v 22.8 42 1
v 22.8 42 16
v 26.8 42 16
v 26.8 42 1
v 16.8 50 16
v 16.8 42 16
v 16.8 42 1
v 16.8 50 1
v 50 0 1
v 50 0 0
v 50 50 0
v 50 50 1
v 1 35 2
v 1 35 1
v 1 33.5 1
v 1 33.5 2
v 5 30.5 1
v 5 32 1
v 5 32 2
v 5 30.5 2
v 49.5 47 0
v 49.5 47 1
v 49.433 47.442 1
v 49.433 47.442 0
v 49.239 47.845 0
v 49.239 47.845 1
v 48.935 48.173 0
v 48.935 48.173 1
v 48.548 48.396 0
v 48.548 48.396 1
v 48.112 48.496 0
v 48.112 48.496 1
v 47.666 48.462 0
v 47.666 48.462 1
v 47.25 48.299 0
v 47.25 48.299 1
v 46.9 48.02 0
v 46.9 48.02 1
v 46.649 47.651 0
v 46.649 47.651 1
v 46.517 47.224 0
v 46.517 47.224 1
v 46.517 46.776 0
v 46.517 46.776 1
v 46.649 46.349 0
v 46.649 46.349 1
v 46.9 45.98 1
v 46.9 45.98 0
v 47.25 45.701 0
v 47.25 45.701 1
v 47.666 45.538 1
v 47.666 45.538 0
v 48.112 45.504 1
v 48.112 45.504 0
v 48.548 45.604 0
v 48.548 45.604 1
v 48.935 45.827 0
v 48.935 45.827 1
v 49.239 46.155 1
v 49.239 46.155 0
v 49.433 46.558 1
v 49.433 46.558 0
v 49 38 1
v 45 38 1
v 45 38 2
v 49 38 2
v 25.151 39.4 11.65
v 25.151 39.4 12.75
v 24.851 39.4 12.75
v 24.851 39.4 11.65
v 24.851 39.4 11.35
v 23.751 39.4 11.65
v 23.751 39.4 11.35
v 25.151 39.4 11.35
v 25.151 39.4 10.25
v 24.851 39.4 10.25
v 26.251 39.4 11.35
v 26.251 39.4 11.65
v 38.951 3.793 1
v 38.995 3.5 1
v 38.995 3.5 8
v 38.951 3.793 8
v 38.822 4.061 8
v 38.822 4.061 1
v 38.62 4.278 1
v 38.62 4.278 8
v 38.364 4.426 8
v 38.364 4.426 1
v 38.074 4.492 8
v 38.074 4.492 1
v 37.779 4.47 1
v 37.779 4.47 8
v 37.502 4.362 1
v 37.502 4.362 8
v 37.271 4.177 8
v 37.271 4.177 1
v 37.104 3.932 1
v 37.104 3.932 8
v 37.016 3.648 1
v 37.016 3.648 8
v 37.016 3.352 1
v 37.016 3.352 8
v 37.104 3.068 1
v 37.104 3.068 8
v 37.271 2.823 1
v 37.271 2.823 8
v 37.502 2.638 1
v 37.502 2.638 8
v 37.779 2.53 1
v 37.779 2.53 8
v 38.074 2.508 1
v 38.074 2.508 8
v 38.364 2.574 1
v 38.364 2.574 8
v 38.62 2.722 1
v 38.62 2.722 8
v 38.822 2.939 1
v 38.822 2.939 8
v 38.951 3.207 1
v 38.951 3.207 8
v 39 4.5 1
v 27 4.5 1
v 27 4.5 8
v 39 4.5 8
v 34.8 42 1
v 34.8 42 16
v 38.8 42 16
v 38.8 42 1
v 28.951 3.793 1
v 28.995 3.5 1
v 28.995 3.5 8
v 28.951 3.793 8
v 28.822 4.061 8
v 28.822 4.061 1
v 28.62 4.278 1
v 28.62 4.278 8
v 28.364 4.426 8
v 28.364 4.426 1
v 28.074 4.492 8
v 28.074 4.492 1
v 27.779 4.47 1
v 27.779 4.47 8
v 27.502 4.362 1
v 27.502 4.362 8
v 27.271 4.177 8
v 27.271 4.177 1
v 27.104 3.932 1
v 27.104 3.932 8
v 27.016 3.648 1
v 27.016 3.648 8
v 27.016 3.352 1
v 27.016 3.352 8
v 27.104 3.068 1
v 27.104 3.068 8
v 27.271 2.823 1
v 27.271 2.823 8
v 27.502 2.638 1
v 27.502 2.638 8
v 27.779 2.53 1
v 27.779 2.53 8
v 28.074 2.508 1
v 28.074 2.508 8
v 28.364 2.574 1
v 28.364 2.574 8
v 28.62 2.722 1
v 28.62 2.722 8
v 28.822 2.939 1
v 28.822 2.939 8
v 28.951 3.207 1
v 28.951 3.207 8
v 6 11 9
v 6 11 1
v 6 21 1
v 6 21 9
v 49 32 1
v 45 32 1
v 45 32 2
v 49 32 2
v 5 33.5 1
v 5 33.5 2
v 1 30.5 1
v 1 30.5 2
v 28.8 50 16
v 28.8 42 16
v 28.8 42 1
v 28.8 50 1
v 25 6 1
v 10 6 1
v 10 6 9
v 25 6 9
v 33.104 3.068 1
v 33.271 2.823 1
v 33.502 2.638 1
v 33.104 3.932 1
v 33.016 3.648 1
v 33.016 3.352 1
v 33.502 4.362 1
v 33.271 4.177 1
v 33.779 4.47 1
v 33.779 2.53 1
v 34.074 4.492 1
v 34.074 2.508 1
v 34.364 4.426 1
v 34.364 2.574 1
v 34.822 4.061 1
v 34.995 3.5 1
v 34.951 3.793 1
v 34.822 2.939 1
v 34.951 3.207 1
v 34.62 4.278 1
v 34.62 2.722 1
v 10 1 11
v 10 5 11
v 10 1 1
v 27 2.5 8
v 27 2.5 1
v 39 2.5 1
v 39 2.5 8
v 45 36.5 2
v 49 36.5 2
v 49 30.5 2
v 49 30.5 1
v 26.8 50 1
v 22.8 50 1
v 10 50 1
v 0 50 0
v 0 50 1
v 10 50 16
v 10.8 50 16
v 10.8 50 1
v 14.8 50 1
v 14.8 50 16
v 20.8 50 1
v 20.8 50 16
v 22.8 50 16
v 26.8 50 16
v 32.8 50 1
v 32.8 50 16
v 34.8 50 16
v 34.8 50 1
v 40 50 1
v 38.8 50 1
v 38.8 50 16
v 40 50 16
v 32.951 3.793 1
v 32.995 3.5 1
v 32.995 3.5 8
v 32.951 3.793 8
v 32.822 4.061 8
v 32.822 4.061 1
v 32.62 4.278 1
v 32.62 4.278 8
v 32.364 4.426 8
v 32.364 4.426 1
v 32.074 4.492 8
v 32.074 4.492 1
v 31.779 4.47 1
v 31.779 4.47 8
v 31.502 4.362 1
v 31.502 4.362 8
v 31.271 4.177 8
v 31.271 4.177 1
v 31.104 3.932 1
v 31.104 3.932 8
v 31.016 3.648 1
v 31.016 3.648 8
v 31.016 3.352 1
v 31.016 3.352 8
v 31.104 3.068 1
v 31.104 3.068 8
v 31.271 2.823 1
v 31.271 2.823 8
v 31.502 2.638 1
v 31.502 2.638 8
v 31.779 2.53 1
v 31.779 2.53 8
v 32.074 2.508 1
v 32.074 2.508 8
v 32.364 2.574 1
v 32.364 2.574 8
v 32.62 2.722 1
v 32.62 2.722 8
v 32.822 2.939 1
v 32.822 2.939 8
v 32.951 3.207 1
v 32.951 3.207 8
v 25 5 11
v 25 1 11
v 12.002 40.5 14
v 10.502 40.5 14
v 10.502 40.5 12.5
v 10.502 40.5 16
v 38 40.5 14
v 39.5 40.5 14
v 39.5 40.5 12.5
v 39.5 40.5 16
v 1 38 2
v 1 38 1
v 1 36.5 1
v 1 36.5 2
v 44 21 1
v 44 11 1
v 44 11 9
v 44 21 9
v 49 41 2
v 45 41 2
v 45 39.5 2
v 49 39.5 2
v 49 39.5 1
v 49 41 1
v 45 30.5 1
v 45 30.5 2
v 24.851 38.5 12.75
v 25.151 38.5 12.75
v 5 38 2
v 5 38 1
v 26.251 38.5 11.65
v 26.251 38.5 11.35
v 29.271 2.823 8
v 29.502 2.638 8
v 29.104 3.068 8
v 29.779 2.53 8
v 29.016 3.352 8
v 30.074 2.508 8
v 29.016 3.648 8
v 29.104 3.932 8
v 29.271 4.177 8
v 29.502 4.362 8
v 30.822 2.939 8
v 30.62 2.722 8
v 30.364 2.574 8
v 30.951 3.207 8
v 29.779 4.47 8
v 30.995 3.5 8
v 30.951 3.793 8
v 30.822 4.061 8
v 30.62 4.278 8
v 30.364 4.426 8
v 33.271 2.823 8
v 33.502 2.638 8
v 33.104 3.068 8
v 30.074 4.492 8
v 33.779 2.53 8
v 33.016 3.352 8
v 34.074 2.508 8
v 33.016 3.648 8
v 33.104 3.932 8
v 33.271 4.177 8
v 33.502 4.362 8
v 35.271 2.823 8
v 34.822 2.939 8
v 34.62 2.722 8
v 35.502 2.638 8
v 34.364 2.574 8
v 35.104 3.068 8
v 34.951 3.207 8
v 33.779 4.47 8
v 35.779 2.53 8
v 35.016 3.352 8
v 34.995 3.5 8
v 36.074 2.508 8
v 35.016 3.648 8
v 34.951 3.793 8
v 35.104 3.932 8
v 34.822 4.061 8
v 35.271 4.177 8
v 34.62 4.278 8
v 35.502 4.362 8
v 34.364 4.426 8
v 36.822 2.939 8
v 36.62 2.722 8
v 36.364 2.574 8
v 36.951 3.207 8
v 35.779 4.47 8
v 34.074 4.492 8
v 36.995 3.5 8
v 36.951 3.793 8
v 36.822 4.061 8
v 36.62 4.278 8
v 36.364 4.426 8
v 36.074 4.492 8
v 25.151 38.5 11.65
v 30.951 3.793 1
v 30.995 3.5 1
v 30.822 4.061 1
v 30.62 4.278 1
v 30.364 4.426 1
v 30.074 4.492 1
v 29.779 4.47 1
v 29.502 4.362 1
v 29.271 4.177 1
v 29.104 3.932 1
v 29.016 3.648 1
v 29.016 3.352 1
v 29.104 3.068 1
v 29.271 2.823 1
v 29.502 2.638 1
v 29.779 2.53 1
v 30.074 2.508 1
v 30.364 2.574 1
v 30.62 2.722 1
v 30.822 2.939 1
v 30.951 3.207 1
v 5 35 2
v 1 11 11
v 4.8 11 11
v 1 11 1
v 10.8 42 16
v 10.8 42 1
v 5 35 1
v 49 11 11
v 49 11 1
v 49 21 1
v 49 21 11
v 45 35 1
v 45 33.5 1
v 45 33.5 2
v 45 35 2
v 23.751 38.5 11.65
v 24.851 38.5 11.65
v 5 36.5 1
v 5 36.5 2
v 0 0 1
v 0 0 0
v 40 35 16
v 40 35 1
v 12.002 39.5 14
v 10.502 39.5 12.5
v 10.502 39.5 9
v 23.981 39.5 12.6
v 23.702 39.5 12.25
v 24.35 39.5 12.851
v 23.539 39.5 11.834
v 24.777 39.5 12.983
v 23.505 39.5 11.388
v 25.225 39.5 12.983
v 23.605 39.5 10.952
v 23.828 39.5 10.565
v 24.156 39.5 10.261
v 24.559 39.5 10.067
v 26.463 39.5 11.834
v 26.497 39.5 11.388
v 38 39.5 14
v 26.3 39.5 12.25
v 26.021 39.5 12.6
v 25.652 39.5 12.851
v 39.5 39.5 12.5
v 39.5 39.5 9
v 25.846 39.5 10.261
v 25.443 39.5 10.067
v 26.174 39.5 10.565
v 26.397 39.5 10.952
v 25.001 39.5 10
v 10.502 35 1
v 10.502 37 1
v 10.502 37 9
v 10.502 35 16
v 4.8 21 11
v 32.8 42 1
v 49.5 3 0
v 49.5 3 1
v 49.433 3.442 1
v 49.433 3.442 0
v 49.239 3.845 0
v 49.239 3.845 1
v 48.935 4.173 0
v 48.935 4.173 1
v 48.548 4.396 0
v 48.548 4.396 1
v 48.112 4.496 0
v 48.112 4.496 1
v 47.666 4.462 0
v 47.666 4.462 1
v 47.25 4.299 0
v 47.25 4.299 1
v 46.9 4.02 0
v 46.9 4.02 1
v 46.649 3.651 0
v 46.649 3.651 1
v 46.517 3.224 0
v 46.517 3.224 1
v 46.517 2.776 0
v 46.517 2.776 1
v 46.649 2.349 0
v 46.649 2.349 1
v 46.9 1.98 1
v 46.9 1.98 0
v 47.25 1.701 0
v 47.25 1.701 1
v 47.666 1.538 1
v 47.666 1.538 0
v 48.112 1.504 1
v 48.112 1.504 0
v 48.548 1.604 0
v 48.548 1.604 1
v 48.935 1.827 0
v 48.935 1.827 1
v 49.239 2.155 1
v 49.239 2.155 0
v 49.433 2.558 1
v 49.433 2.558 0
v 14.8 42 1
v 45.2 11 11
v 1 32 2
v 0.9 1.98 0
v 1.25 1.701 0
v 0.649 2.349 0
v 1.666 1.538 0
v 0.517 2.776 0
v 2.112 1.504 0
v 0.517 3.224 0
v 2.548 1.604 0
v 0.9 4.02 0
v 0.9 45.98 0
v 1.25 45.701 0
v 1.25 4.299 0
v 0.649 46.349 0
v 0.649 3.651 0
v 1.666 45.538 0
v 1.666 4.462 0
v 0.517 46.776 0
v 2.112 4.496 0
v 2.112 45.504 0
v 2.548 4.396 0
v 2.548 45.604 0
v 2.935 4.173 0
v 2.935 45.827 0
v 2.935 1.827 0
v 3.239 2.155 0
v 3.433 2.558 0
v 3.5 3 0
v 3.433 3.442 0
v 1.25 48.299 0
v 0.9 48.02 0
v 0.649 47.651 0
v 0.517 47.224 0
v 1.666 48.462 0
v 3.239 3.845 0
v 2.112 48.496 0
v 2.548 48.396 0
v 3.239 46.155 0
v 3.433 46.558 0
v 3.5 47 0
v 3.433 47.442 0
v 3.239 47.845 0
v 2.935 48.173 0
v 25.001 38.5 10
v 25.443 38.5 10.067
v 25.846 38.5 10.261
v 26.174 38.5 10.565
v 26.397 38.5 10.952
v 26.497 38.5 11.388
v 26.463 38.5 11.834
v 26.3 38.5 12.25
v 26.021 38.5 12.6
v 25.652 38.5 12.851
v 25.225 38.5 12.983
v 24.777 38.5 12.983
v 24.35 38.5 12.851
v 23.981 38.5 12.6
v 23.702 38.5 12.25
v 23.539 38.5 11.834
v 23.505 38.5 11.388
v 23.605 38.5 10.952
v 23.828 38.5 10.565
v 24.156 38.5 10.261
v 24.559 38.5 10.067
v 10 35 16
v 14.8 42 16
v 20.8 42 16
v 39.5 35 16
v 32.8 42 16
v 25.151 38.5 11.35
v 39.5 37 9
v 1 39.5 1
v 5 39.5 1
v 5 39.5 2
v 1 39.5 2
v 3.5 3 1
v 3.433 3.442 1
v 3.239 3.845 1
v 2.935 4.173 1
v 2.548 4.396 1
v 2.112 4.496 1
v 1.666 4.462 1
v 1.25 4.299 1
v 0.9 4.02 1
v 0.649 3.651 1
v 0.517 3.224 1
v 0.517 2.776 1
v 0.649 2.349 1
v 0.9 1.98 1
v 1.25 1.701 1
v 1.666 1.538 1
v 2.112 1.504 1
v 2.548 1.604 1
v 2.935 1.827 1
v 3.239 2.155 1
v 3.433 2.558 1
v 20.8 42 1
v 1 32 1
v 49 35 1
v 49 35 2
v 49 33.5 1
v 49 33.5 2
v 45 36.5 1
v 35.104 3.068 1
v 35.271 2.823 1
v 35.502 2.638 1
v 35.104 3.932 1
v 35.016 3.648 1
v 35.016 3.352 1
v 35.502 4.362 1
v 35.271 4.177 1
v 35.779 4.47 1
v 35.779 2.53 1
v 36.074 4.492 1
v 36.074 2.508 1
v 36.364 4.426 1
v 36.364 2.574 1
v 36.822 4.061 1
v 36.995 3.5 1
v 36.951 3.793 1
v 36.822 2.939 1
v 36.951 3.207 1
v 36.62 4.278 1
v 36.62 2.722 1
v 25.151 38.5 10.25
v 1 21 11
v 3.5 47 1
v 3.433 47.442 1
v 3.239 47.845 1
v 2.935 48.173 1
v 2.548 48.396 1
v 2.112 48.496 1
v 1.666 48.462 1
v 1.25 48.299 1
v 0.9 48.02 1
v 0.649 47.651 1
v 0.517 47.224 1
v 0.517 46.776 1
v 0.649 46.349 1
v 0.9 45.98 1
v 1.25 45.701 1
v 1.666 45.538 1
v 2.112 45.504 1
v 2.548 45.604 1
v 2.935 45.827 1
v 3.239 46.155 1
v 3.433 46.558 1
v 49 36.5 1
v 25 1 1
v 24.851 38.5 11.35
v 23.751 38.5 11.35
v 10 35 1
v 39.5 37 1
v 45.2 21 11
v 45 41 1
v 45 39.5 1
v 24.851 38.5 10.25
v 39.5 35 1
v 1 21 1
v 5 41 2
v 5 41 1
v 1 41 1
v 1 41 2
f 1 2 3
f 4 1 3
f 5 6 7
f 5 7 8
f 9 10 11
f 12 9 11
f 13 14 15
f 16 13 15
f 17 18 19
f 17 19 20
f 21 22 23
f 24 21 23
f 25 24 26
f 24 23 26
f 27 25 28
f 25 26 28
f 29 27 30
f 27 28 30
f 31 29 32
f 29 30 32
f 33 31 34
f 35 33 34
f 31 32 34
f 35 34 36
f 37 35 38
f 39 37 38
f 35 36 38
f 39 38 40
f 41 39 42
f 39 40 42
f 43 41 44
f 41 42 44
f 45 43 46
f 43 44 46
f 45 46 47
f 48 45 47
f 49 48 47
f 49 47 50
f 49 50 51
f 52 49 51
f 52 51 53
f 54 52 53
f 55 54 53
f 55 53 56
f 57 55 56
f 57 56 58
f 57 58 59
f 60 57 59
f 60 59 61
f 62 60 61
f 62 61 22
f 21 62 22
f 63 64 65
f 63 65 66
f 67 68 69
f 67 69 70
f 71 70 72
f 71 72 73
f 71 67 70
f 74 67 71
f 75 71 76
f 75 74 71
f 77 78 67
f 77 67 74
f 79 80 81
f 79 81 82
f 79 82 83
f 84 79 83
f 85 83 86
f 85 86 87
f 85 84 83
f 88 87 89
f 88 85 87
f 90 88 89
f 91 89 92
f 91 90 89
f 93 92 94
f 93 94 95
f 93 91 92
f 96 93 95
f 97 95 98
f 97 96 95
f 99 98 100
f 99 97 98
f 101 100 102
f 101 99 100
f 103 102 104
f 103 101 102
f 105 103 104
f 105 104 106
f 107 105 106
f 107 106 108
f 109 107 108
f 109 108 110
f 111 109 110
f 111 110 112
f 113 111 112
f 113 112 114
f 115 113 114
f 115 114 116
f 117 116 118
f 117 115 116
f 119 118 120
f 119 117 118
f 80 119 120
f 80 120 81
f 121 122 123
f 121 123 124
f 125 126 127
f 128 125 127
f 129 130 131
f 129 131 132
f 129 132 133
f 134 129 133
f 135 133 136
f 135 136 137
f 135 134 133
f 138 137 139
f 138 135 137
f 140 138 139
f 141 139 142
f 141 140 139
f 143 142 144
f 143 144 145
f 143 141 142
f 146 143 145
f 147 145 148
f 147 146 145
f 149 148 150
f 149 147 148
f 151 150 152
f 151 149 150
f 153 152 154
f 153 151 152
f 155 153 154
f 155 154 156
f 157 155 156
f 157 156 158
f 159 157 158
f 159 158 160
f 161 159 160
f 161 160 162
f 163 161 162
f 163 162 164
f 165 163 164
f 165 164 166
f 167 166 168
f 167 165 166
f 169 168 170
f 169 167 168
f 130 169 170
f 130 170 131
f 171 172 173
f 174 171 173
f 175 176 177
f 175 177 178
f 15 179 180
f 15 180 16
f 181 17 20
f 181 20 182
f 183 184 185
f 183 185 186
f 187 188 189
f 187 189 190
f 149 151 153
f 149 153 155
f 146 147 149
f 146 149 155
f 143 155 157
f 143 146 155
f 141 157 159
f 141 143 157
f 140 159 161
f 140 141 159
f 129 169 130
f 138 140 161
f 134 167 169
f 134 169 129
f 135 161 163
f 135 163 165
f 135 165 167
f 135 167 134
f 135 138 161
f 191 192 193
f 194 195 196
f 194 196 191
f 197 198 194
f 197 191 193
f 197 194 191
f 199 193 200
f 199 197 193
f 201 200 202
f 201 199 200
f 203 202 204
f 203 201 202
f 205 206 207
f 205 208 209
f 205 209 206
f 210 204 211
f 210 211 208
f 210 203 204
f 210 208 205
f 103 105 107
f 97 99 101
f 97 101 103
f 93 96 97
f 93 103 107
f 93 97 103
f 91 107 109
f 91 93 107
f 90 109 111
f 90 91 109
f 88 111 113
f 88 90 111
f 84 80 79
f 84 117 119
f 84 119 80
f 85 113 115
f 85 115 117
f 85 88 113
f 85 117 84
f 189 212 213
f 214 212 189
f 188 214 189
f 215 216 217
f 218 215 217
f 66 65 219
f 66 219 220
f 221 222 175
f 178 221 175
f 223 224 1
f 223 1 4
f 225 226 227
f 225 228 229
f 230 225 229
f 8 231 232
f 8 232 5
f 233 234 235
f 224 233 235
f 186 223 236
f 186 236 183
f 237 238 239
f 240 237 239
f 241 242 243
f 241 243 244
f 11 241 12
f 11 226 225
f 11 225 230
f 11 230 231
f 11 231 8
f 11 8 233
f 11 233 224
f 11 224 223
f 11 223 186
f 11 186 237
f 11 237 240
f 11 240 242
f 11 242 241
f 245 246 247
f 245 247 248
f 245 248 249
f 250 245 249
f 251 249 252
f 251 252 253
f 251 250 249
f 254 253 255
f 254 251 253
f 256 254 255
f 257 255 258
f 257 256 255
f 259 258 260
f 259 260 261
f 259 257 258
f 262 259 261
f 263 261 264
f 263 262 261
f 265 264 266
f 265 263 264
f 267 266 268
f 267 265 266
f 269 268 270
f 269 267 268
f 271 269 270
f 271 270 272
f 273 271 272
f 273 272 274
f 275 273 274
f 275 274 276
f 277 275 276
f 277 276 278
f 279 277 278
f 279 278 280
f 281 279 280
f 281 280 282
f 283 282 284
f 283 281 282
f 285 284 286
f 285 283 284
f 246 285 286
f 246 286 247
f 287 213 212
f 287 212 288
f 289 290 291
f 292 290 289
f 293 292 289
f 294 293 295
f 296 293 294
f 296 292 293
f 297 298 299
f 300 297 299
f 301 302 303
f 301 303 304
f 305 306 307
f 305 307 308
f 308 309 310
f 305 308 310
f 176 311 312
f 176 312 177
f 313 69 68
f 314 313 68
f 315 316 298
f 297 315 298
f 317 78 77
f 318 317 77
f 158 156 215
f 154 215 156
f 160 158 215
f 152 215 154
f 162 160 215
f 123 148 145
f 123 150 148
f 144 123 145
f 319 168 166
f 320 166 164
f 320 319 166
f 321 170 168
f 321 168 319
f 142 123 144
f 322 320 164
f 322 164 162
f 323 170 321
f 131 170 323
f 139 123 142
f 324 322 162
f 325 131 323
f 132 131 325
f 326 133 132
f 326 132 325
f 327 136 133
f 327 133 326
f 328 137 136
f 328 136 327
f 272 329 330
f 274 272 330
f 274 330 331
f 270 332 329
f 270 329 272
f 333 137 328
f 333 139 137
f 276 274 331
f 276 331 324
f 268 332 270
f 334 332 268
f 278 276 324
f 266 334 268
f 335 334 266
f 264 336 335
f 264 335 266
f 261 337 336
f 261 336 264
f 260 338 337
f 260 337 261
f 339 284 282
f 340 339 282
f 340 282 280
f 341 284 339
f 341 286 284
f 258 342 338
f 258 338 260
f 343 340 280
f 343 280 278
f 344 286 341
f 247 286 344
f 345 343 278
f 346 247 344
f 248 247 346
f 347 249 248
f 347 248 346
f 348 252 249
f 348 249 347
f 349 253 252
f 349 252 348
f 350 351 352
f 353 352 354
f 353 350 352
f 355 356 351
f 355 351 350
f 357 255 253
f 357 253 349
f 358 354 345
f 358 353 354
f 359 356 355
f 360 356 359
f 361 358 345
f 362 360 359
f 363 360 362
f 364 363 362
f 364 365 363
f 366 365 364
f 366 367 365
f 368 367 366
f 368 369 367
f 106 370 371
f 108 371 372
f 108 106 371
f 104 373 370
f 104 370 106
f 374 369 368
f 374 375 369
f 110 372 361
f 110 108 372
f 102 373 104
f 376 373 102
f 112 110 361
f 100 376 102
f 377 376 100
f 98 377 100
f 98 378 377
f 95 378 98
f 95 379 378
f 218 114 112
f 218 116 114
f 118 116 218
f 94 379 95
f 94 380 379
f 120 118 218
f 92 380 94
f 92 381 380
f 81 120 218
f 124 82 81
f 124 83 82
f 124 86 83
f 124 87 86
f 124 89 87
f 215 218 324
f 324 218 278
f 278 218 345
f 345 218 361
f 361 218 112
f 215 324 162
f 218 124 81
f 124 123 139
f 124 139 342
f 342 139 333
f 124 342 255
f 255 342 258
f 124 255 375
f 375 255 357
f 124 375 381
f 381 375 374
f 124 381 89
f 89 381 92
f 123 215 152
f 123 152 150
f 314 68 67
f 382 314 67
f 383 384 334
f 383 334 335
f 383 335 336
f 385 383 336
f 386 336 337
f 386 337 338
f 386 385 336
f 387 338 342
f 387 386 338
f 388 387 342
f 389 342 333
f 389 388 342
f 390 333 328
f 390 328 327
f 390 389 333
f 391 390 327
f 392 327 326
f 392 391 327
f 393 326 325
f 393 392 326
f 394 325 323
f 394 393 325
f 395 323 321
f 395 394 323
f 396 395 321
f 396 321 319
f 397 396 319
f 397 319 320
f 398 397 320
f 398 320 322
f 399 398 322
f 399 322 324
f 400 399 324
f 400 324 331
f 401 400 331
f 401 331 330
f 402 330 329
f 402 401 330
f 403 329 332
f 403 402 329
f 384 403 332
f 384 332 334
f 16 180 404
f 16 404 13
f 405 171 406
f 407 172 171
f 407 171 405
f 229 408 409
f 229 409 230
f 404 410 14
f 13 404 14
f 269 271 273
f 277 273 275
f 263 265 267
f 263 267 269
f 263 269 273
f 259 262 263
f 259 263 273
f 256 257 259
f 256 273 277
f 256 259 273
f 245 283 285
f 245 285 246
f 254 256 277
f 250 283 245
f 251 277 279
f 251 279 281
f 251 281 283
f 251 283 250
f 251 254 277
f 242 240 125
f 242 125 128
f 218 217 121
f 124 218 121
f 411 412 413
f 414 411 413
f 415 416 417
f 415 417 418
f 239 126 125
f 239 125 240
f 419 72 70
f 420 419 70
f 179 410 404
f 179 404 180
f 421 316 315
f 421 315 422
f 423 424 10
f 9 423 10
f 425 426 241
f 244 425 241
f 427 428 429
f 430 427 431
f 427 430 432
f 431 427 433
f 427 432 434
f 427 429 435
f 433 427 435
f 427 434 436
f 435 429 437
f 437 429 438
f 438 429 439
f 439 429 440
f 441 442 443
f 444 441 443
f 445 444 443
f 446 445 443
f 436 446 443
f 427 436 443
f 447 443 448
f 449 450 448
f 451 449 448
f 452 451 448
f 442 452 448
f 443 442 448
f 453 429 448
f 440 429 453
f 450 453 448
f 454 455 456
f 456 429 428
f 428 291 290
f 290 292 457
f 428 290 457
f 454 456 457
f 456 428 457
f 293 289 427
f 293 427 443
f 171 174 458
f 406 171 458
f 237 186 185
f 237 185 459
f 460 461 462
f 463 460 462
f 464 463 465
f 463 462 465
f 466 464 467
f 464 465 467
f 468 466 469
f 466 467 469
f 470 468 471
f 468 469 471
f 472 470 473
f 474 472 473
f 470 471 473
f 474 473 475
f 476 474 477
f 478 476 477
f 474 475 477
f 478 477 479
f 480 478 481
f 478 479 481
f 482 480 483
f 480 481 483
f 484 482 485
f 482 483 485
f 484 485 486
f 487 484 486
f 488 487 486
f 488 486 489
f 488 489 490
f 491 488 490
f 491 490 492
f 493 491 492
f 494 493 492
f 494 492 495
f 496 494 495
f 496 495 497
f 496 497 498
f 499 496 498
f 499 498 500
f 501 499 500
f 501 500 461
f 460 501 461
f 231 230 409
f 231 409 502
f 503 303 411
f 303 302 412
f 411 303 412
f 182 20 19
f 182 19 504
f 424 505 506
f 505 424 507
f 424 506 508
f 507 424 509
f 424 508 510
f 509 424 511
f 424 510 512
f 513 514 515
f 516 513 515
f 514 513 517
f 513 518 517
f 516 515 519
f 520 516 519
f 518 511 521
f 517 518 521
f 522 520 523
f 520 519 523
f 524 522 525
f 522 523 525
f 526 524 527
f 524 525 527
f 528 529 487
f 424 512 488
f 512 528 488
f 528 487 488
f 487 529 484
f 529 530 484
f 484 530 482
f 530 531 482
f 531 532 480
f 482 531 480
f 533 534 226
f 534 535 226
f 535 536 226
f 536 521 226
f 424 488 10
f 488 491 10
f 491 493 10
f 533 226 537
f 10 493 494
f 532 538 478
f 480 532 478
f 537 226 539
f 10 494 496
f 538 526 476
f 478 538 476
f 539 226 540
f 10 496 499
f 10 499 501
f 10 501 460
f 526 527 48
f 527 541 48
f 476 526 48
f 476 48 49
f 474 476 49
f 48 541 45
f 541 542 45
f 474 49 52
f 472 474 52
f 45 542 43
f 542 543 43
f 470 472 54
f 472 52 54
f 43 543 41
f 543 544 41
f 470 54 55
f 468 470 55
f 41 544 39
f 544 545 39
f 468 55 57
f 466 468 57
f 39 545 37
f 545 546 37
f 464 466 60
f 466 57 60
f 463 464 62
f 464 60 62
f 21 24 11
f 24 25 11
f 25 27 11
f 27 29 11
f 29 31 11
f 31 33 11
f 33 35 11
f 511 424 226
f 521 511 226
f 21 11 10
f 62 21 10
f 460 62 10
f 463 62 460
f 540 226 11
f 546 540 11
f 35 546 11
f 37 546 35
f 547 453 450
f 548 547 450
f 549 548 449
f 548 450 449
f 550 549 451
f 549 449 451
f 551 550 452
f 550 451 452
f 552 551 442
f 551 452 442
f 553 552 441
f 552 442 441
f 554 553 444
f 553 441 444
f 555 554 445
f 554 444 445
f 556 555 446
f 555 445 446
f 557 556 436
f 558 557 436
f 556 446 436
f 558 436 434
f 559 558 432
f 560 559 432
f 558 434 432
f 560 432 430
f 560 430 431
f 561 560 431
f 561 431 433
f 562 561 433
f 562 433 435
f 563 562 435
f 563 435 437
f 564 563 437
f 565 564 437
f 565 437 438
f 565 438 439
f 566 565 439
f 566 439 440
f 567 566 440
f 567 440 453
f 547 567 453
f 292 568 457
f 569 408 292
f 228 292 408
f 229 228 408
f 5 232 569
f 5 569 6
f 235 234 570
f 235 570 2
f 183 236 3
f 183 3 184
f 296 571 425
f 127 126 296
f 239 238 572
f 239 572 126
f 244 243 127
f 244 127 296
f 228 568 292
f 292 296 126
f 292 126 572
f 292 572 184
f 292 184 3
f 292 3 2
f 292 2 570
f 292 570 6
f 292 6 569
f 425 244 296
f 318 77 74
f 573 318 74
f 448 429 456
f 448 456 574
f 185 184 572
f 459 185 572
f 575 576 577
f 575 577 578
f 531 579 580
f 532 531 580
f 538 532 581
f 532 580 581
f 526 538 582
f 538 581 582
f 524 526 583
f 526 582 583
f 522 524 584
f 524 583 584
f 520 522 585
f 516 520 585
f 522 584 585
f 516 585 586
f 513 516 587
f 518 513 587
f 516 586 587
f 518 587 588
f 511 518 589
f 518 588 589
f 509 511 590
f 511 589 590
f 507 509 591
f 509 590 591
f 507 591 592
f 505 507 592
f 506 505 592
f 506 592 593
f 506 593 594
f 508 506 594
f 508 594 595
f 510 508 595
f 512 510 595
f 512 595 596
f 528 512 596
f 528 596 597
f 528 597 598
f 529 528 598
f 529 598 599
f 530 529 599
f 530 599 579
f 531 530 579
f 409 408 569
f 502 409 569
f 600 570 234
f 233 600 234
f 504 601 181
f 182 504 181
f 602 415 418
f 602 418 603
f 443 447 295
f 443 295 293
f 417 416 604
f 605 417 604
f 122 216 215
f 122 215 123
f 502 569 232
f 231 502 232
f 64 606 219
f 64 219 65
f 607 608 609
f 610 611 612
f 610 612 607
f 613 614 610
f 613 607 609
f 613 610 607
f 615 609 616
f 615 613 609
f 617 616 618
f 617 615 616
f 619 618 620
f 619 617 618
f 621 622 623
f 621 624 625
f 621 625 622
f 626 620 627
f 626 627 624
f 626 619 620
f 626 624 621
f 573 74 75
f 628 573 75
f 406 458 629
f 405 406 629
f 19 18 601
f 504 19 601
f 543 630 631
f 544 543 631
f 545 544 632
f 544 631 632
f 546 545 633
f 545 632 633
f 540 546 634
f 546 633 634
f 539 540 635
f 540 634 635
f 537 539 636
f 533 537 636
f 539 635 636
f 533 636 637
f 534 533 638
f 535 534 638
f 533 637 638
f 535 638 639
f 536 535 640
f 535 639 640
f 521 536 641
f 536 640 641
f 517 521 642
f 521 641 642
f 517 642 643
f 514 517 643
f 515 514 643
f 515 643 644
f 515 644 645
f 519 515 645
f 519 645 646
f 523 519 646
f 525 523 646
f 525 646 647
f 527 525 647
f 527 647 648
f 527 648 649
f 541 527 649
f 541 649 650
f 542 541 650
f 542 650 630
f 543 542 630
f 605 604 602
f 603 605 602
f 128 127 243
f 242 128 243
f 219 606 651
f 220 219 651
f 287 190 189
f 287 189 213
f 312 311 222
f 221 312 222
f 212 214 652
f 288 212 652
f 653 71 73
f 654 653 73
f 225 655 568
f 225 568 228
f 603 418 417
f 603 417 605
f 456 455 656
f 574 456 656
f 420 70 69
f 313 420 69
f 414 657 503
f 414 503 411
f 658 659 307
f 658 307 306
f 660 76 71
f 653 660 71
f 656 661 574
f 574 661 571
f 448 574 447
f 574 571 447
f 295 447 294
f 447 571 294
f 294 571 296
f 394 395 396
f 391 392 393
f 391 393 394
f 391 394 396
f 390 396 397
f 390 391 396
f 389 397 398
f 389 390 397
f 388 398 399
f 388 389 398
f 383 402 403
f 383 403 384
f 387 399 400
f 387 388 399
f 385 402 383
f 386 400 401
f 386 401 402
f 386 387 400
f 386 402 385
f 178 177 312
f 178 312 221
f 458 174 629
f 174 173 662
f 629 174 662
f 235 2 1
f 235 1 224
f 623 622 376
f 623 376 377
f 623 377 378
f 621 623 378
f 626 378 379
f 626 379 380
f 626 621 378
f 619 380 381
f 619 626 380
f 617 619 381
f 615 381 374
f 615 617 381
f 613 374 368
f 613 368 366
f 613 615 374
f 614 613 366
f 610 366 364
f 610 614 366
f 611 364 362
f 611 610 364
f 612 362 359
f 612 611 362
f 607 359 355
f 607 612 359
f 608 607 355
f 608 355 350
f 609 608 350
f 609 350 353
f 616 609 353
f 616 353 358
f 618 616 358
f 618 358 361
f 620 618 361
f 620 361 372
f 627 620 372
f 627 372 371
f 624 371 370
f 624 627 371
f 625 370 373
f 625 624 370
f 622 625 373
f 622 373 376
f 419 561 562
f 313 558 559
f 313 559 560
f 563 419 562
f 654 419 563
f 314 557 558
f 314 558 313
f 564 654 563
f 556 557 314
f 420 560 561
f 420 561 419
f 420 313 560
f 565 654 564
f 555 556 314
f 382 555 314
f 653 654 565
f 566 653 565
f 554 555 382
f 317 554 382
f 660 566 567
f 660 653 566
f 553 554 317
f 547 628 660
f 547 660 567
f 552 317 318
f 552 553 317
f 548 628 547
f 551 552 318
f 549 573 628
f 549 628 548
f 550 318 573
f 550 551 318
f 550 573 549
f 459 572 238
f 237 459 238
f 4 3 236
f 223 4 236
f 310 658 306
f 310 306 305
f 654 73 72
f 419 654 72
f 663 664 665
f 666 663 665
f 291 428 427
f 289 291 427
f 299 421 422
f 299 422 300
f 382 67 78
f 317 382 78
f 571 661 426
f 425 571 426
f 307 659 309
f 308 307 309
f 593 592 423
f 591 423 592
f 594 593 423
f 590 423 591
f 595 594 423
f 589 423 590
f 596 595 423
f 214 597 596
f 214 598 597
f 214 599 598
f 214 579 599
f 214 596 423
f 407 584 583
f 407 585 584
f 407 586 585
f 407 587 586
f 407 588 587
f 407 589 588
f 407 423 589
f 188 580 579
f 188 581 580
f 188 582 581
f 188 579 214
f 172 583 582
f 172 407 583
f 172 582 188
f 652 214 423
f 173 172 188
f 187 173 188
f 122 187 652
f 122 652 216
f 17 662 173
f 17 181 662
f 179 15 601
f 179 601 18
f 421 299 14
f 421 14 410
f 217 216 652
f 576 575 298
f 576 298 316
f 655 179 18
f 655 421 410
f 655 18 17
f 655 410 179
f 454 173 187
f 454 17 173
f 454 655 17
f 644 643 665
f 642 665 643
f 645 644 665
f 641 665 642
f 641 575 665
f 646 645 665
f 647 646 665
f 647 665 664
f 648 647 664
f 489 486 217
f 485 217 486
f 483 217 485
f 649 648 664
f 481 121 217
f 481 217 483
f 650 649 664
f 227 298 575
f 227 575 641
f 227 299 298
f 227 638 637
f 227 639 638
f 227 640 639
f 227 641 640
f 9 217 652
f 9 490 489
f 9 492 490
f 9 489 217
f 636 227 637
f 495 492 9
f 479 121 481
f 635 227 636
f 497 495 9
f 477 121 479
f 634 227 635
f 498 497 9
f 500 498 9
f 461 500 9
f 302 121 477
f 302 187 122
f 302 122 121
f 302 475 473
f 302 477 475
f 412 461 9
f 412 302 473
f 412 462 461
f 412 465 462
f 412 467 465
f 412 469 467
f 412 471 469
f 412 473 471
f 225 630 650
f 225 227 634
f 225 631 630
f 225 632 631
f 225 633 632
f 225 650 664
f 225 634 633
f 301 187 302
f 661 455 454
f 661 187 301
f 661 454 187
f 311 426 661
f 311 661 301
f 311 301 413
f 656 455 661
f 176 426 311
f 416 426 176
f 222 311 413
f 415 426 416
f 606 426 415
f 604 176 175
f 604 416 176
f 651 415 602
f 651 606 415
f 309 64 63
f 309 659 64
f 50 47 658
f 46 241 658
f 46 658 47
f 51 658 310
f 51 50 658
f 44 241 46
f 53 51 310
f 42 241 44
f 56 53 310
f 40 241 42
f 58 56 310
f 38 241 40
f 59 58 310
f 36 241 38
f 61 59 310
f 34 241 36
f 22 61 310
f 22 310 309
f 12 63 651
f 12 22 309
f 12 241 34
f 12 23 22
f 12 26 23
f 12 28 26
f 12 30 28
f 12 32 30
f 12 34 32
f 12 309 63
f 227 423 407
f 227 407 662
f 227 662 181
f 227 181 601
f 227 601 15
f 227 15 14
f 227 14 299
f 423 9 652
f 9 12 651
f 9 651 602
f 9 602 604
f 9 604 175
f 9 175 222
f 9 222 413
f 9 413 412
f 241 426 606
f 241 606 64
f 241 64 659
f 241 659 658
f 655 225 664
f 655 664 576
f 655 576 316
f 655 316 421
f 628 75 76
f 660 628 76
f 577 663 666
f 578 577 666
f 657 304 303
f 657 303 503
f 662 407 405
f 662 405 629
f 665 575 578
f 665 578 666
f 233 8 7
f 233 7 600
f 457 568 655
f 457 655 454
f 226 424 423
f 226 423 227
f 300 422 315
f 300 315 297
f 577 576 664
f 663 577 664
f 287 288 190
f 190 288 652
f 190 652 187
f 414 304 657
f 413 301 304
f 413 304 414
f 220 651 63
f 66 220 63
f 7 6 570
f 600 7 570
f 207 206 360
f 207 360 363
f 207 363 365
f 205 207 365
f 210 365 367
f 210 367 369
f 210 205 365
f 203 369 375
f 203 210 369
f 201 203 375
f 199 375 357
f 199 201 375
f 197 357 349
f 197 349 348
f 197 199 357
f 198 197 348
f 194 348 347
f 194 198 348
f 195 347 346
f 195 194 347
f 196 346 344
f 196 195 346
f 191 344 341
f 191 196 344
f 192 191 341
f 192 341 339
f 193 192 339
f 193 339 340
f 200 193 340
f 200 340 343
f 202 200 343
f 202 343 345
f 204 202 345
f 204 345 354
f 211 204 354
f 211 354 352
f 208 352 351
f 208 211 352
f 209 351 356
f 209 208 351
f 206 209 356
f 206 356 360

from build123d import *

# Parameters (mm, degrees)
SKETCH1_W               = 50
SKETCH1_H               = 50
BOSS_EXTRUDE1_DEPTH     = 1
SKETCH2_W               = 30
SKETCH2_H               = 15
BOSS_EXTRUDE2_DEPTH     = 15
SKETCH3_W               = 4
SKETCH3_H               = 8
CUT_EXTRUDE1_DEPTH      = 15
LPATTERN1_COUNT         = 5
LPATTERN1_PITCH         = 6
SKETCH4_W               = 28.997930891
SKETCH4_H               = 2
SKETCH4_H_2             = 2.5
SKETCH4_H_3             = 1
CUT_EXTRUDE2_DEPTH      = 2
CUT_EXTRUDE3_START      = -7
SKETCH4_3_W             = 28.997930891
SKETCH4_3_H             = 2
SKETCH4_3_H_2           = 2.5
CUT_EXTRUDE3_DEPTH      = 5
CUT_EXTRUDE4_START      = -15
SKETCH4_4_W             = 28.997930891
SKETCH4_4_H             = 2
CUT_EXTRUDE4_DEPTH      = 8
CUT_EXTRUDE5_DEPTH      = 1
SKETCH6_R               = 1.5
SKETCH6_W               = 2.5
SKETCH6_H               = 0.3
SKETCH6_W_2             = 0.3
SKETCH6_H_2             = 2.5
SKETCH6_H_3             = 1.1
SKETCH6_W_3             = 1.1
BOSS_EXTRUDE3_DEPTH     = 0.1
SKETCH6_3_R             = 1.5
BOSS_EXTRUDE4_DEPTH     = 1
SKETCH7_R               = 1.5
CUT_EXTRUDE6_DEPTH      = 73.284161474
SKETCH8_W               = 4
SKETCH8_H               = 1.5
BOSS_EXTRUDE5_DEPTH     = 1
LPATTERN2_COUNT         = 4
LPATTERN2_PITCH         = 3
MIRROR1_COPY_1_SKETCH_W = 4
MIRROR1_COPY_1_SKETCH_H = 1.5
MIRROR1_COPY_1_DEPTH    = 1
MIRROR1_COPY_2_SKETCH_W = 4
MIRROR1_COPY_2_SKETCH_H = 1.5
MIRROR1_COPY_2_DEPTH    = 1
MIRROR1_COPY_3_SKETCH_W = 4
MIRROR1_COPY_3_SKETCH_H = 1.5
MIRROR1_COPY_3_DEPTH    = 1
SKETCH9_W               = 5
SKETCH9_H               = 10
BOSS_EXTRUDE6_DEPTH     = 10
CUT_EXTRUDE7_DEPTH      = 10
SKETCH11_W              = 15
SKETCH11_H              = 5
BOSS_EXTRUDE7_DEPTH     = 10
CUT_EXTRUDE8_REACH      = 60.146
SKETCH13_W              = 2
SKETCH13_H              = 2
SKETCH13_R              = 0.995
BOSS_EXTRUDE9_DEPTH     = 7
LPATTERN3_COUNT         = 6
LPATTERN3_PITCH         = 2


with BuildPart() as part:
    # Sketch1 → Boss-Extrude1 (new body)
    with BuildSketch(Plane.XY):
        with Locations((25, 25)):
            Rectangle(SKETCH1_W, SKETCH1_H)
    extrude(amount=BOSS_EXTRUDE1_DEPTH)

    # Sketch2 → Boss-Extrude2 (add)
    with BuildSketch(Plane.XY.offset(1)):
        with Locations((25, 42.5)):
            Rectangle(SKETCH2_W, SKETCH2_H)
    extrude(amount=BOSS_EXTRUDE2_DEPTH)

    # Sketch3 → Cut-Extrude1 (cut)
    with BuildSketch(Plane.XY.offset(16)):
        with Locations((12.8, 46)):
            Rectangle(SKETCH3_W, SKETCH3_H)
    cut_extrude1 = extrude(amount=-CUT_EXTRUDE1_DEPTH, mode=Mode.SUBTRACT)

    # LPattern1: Cut-Extrude1 ×5
    with Locations(*[(i * LPATTERN1_PITCH, 0, 0) for i in range(1, LPATTERN1_COUNT)]):
        add(cut_extrude1, mode=Mode.SUBTRACT)

    # Sketch4 → Cut-Extrude2 (cut)
    with BuildSketch(Plane.XY.offset(16)):
        with Locations((25.001034555, 36)):
            Rectangle(SKETCH4_W, SKETCH4_H)
        with Locations((25.001034555, 38.25)):
            Rectangle(SKETCH4_W, SKETCH4_H_2)
        with Locations((25.001034555, 40)):
            Rectangle(SKETCH4_W, SKETCH4_H_3)
    extrude(amount=-CUT_EXTRUDE2_DEPTH, mode=Mode.SUBTRACT)

    # Sketch4<3> → Cut-Extrude3 (cut)
    with BuildSketch(Plane.XY.offset(16).offset(CUT_EXTRUDE3_START)):
        with Locations((25.001034555, 36)):
            Rectangle(SKETCH4_3_W, SKETCH4_3_H)
        with Locations((25.001034555, 38.25)):
            Rectangle(SKETCH4_3_W, SKETCH4_3_H_2)
    extrude(amount=CUT_EXTRUDE3_DEPTH, mode=Mode.SUBTRACT)

    # Sketch4<4> → Cut-Extrude4 (cut)
    with BuildSketch(Plane.XY.offset(16).offset(CUT_EXTRUDE4_START)):
        with Locations((25.001034555, 36)):
            Rectangle(SKETCH4_4_W, SKETCH4_4_H)
    extrude(amount=CUT_EXTRUDE4_DEPTH, mode=Mode.SUBTRACT)

    # Sketch5 → Cut-Extrude5 (cut)
    with BuildSketch(Plane.XZ.offset(-39.5)):
        Polygon((12.002069109, 14), (10.502069109, 14), (10.502069109, 12.5), align=None)
        Polygon((38, 14), (39.5, 14), (39.5, 12.5), align=None)
    extrude(amount=-CUT_EXTRUDE5_DEPTH, mode=Mode.SUBTRACT)

    # Sketch6 → Boss-Extrude3 (add)
    # profile 1 of 6: a face of its own
    with BuildSketch(Plane.XZ.offset(-39.5)):
        with Locations(Location((25.001034554, 11.5, 0), (0, 0, 270))):
            Circle(SKETCH6_R)
        with Locations((25.001034554, 11.5)):
            Rectangle(SKETCH6_W, SKETCH6_H, mode=Mode.SUBTRACT)
        with Locations((25.001034554, 11.5)):
            Rectangle(SKETCH6_W_2, SKETCH6_H_2, mode=Mode.SUBTRACT)
    # profile 2 of 6: a face of its own
    with BuildSketch(Plane.XZ.offset(-39.5)):
        with Locations((25.001034554, 10.8)):
            Rectangle(SKETCH6_W_2, SKETCH6_H_3)
    # profile 3 of 6: a face of its own
    with BuildSketch(Plane.XZ.offset(-39.5)):
        with Locations((25.701034554, 11.5)):
            Rectangle(SKETCH6_W_3, SKETCH6_H)
    # profile 4 of 6: a face of its own
    with BuildSketch(Plane.XZ.offset(-39.5)):
        with Locations((25.001034554, 12.2)):
            Rectangle(SKETCH6_W_2, SKETCH6_H_3)
    # profile 5 of 6: a face of its own
    with BuildSketch(Plane.XZ.offset(-39.5)):
        with Locations((25.001034554, 11.5)):
            Rectangle(SKETCH6_W_2, SKETCH6_H)
    # profile 6 of 6: a face of its own
    with BuildSketch(Plane.XZ.offset(-39.5)):
        with Locations((24.301034554, 11.5)):
            Rectangle(SKETCH6_W_3, SKETCH6_H)
    extrude(amount=BOSS_EXTRUDE3_DEPTH)

    # Sketch6<3> → Boss-Extrude4 (add)
    with BuildSketch(Plane.XZ.offset(-39.5)):
        with Locations(Location((25.001034554, 11.5, 0), (0, 0, 270))):
            Circle(SKETCH6_3_R)
        Polygon((25.151034554, 10.25), (24.851034554, 10.25), (24.851034554, 11.35), (23.751034554, 11.35), (23.751034554, 11.65), (24.851034554, 11.65), (24.851034554, 12.75), (25.151034554, 12.75), (25.151034554, 11.65), (26.251034554, 11.65), (26.251034554, 11.35), (25.151034554, 11.35), align=None, mode=Mode.SUBTRACT)
    extrude(amount=BOSS_EXTRUDE4_DEPTH)

    # Sketch7 → Cut-Extrude6 (cut, through all)
    with BuildSketch(Plane.XY.offset(1)):
        with Locations((48, 47)):
            Circle(SKETCH7_R)
        with Locations((48, 3)):
            Circle(SKETCH7_R)
        with Locations((2, 3)):
            Circle(SKETCH7_R)
        with Locations((2, 47)):
            Circle(SKETCH7_R)
    extrude(amount=-CUT_EXTRUDE6_DEPTH, mode=Mode.SUBTRACT)

    # Sketch8 → Boss-Extrude5 (add)
    with BuildSketch(Plane.XY.offset(1)):
        with Locations((47, 40.25)):
            Rectangle(SKETCH8_W, SKETCH8_H)
    boss_extrude5 = extrude(amount=BOSS_EXTRUDE5_DEPTH)

    # LPattern2: Boss-Extrude5 ×4
    with Locations(*[(0, -i * LPATTERN2_PITCH, 0) for i in range(1, LPATTERN2_COUNT)]):
        add(boss_extrude5)

    # Mirror1: Boss-Extrude5 across plane
    add(boss_extrude5.mirror(Plane(origin=(25, 0, 0), x_dir=(0, 0, 1), z_dir=(1, 0, 0))))

    # Mirror1 copy 1 sketch → Mirror1 copy 1 (add)
    with BuildSketch(Plane(origin=(50, -3, 1), x_dir=(-1, 0, 0), z_dir=(0, 0, 1))):
        with Locations((47, -40.25)):
            Rectangle(MIRROR1_COPY_1_SKETCH_W, MIRROR1_COPY_1_SKETCH_H)
    extrude(amount=MIRROR1_COPY_1_DEPTH)

    # Mirror1 copy 2 sketch → Mirror1 copy 2 (add)
    with BuildSketch(Plane(origin=(50, -6, 1), x_dir=(-1, 0, 0), z_dir=(0, 0, 1))):
        with Locations((47, -40.25)):
            Rectangle(MIRROR1_COPY_2_SKETCH_W, MIRROR1_COPY_2_SKETCH_H)
    extrude(amount=MIRROR1_COPY_2_DEPTH)

    # Mirror1 copy 3 sketch → Mirror1 copy 3 (add)
    with BuildSketch(Plane(origin=(50, -9, 1), x_dir=(-1, 0, 0), z_dir=(0, 0, 1))):
        with Locations((47, -40.25)):
            Rectangle(MIRROR1_COPY_3_SKETCH_W, MIRROR1_COPY_3_SKETCH_H)
    extrude(amount=MIRROR1_COPY_3_DEPTH)

    # Sketch9 → Boss-Extrude6 (add)
    with BuildSketch(Plane.XY.offset(1)):
        with Locations((46.5, 16)):
            Rectangle(SKETCH9_W, SKETCH9_H)
    boss_extrude6 = extrude(amount=BOSS_EXTRUDE6_DEPTH)

    # Sketch10 → Cut-Extrude7 (cut)
    with BuildSketch(Plane(origin=(0, 21, 0), x_dir=(1, 0, 0), z_dir=(0, 1, 0))):
        Polygon((45.2, -11), (44, -11), (44, -9), align=None)
    cut_extrude7 = extrude(amount=-CUT_EXTRUDE7_DEPTH, mode=Mode.SUBTRACT)

    # Mirror2: Boss-Extrude6, Cut-Extrude7 across plane
    add(boss_extrude6.mirror(Plane(origin=(25, 0, 0), x_dir=(0, 0, 1), z_dir=(1, 0, 0))))
    add(cut_extrude7.mirror(Plane(origin=(25, 0, 0), x_dir=(0, 0, 1), z_dir=(1, 0, 0))), mode=Mode.SUBTRACT)

    # Sketch11 → Boss-Extrude7 (add)
    with BuildSketch(Plane.XY.offset(1)):
        with Locations((17.5, 3.5)):
            Rectangle(SKETCH11_W, SKETCH11_H)
    extrude(amount=BOSS_EXTRUDE7_DEPTH)

    # Sketch12 → Cut-Extrude8 (cut, up to next)
    with BuildSketch(Plane(origin=(25, 0, 0), x_dir=(0, 0, -1), z_dir=(1, 0, 0)), mode=Mode.PRIVATE) as cut_extrude8_sk1:
        Polygon((-11, 5), (-11, 6), (-9, 6), align=None)
    cut_extrude8_tool1 = extrude(cut_extrude8_sk1.sketch, amount=-CUT_EXTRUDE8_REACH, mode=Mode.PRIVATE) & part.part
    add(cut_extrude8_tool1.solids().sort_by_distance((25, 5.666667, 10.333333))[0], mode=Mode.SUBTRACT)

    # Sketch13 → Boss-Extrude9 (add)
    with BuildSketch(Plane.XY.offset(1)):
        with Locations((28, 3.5)):
            Rectangle(SKETCH13_W, SKETCH13_H)
        with Locations((28, 3.5)):
            Circle(SKETCH13_R, mode=Mode.SUBTRACT)
    boss_extrude9 = extrude(amount=BOSS_EXTRUDE9_DEPTH)

    # LPattern3: Boss-Extrude9 ×6
    with Locations(*[(i * LPATTERN3_PITCH, 0, 0) for i in range(1, LPATTERN3_COUNT)]):
        add(boss_extrude9)


solid = part.part
